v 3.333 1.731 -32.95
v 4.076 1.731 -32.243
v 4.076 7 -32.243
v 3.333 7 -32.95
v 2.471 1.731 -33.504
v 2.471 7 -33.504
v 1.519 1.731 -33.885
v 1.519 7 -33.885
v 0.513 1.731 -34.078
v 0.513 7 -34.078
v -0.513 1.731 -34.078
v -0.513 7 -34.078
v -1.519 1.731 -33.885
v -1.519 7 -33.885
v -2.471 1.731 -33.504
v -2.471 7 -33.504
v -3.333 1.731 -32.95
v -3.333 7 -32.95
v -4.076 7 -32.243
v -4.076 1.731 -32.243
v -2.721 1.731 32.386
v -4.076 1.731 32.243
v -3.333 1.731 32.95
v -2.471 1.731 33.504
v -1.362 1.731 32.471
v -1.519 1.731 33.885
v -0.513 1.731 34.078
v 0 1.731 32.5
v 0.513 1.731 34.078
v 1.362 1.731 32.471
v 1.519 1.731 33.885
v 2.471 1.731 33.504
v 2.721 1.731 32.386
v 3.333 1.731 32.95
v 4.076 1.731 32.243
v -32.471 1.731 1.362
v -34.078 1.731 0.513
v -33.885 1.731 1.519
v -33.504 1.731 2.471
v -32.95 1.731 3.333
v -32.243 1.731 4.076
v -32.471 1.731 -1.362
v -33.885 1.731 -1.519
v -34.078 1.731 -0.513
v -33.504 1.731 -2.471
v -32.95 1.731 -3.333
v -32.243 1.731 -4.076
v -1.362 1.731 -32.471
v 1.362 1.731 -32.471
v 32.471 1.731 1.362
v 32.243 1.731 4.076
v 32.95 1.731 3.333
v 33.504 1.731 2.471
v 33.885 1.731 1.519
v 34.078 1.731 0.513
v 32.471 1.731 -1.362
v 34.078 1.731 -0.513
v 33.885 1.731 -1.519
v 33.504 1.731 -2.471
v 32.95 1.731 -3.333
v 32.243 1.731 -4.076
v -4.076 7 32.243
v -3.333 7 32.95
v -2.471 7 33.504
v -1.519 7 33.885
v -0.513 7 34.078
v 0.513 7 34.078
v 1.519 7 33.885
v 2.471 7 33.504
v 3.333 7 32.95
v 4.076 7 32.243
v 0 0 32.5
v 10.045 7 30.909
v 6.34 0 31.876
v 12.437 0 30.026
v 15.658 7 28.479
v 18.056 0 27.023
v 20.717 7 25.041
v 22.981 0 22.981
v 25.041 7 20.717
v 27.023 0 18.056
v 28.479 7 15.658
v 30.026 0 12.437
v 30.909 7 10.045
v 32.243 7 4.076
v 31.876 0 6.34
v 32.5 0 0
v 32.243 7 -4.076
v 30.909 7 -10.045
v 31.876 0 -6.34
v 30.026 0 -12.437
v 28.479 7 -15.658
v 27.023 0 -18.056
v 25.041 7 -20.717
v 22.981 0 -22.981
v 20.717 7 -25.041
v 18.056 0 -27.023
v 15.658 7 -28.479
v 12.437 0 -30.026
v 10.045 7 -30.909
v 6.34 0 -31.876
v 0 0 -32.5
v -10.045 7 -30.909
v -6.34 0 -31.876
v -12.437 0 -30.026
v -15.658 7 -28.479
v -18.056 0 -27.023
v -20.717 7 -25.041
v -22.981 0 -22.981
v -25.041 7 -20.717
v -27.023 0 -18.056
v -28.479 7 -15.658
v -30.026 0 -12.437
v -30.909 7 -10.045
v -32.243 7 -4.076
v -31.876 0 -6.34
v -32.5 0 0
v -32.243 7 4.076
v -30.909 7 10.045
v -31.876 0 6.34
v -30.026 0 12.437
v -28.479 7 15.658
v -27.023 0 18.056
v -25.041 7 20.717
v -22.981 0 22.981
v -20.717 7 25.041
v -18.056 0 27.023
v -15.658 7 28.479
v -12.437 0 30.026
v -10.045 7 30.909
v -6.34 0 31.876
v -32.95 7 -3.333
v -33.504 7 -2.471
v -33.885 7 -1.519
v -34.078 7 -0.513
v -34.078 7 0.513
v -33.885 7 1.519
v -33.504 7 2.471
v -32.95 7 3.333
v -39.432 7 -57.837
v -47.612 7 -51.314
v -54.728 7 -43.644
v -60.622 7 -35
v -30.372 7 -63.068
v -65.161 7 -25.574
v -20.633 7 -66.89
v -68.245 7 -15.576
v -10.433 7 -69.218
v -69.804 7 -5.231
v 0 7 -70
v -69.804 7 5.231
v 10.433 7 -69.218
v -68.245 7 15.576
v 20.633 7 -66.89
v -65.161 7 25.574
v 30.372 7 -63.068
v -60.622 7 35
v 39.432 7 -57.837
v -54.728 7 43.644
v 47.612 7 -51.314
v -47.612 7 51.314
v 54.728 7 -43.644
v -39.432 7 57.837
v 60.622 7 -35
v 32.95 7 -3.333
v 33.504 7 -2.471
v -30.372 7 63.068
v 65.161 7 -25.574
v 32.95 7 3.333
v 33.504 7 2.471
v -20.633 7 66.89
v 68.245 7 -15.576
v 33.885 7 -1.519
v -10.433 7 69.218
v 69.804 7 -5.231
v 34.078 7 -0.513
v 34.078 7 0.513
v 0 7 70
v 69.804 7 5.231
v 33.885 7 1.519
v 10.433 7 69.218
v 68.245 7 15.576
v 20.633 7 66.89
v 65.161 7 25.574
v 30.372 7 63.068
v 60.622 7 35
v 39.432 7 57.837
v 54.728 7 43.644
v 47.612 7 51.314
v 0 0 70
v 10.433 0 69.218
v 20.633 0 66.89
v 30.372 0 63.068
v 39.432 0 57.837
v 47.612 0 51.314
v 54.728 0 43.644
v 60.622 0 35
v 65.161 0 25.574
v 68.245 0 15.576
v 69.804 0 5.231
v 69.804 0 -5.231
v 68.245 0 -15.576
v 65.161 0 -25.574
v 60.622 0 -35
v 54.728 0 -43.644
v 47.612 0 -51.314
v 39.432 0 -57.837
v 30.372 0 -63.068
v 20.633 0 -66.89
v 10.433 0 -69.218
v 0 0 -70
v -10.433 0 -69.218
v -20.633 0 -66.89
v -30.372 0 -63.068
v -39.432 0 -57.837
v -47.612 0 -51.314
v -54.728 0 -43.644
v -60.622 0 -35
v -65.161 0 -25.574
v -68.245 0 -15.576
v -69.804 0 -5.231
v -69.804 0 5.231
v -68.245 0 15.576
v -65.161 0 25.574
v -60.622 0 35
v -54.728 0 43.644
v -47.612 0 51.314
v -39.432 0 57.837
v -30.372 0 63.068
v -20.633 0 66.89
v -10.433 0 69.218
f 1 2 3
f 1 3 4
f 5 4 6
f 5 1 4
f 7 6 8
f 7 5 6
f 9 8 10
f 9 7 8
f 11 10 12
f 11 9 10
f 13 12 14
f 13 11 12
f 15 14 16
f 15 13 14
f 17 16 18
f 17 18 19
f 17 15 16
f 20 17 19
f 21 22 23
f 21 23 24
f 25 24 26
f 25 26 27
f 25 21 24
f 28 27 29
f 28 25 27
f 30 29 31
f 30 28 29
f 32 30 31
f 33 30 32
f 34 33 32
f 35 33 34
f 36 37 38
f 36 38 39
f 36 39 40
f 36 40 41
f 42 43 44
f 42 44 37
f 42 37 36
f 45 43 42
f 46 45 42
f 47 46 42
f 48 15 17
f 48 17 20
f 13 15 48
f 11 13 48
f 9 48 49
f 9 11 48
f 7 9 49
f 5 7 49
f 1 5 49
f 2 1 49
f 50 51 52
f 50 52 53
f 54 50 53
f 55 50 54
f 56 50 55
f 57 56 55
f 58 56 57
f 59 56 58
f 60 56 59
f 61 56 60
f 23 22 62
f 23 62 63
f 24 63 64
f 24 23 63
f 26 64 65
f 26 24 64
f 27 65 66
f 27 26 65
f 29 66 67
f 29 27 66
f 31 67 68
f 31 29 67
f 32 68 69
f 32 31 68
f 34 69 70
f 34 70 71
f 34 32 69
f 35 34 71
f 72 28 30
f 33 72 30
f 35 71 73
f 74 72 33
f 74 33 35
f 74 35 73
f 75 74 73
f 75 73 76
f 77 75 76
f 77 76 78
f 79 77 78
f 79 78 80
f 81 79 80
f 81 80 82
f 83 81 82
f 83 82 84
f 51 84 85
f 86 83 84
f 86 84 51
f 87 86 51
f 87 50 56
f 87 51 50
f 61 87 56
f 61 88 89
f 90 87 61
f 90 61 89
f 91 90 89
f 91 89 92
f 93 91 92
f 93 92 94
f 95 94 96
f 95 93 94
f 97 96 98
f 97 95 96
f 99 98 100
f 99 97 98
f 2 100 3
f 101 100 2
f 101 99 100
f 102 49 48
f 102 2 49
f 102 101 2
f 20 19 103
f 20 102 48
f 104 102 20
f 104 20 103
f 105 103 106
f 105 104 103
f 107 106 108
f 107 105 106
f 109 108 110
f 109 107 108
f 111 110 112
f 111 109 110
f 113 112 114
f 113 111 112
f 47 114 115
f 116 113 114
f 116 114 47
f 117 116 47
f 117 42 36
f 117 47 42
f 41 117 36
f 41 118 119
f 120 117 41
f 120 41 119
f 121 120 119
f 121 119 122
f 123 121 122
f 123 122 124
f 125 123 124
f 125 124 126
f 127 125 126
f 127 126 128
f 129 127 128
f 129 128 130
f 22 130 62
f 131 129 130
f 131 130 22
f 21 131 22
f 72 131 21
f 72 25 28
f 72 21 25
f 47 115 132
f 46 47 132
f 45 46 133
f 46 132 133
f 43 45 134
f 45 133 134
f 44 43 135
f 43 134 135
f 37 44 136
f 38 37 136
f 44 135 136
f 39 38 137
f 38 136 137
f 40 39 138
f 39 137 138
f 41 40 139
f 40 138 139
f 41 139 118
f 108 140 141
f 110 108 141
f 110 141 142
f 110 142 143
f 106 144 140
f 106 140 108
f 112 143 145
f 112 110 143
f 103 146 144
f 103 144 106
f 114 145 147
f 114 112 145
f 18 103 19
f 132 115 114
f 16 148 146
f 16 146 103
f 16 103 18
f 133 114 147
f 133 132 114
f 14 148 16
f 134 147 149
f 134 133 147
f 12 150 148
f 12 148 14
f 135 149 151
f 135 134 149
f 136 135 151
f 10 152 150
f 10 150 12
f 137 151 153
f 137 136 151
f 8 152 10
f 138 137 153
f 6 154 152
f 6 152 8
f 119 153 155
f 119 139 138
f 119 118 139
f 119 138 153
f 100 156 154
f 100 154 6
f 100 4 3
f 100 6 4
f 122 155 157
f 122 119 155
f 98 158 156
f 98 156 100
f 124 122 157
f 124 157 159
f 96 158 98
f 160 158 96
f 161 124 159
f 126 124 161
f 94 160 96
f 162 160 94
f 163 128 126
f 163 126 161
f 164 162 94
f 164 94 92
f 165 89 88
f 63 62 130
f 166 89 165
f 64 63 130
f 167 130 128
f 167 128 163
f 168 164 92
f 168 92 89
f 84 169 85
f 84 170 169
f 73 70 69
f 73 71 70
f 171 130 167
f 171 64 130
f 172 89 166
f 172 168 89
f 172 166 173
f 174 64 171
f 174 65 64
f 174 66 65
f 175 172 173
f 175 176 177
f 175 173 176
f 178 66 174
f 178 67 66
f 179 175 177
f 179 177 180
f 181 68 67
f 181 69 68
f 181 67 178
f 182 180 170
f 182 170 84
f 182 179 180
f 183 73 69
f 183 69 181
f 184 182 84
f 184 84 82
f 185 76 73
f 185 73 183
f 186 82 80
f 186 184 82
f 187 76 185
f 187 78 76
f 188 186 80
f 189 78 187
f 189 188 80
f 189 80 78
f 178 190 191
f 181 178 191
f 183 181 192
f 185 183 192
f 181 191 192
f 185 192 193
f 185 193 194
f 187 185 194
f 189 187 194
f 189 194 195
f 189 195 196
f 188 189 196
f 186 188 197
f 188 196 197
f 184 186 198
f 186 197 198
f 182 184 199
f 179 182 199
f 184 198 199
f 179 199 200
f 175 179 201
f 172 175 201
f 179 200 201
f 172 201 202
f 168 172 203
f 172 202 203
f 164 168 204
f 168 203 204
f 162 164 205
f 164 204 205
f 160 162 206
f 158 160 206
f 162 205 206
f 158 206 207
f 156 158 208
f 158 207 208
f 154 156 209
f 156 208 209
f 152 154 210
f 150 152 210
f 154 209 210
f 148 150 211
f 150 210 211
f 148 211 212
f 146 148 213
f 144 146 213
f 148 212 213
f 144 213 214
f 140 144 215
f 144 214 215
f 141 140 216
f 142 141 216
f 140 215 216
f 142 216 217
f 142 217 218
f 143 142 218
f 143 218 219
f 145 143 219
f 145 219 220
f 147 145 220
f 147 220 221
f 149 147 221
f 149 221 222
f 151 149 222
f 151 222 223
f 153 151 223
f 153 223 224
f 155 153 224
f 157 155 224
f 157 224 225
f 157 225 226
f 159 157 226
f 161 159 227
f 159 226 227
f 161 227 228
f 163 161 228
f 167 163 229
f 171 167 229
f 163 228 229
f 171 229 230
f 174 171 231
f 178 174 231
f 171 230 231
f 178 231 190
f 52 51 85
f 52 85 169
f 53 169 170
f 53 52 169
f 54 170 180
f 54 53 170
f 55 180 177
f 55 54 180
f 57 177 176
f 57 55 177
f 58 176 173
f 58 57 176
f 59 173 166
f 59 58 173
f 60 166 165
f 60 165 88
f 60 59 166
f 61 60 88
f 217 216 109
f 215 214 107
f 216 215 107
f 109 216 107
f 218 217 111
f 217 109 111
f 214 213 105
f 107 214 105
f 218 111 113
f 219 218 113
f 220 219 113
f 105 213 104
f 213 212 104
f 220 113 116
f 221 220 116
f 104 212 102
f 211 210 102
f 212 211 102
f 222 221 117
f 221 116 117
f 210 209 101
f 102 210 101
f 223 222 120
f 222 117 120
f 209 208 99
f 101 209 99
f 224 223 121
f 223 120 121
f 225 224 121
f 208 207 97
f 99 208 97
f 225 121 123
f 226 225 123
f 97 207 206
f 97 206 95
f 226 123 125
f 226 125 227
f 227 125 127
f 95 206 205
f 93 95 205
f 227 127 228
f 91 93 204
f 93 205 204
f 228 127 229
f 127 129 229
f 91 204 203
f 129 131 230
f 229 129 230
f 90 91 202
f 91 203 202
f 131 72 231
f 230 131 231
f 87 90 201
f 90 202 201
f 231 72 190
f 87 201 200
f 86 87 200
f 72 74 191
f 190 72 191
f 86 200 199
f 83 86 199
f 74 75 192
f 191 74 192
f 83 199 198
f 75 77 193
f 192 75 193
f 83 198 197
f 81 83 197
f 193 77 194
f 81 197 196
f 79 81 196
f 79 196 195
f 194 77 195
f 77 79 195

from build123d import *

# Parameters (mm, degrees)
SKETCH1_R           = 70
BOSS_EXTRUDE1_DEPTH = 7
SKETCH2_R           = 32.5
CUT_EXTRUDE1_DEPTH  = 100.242128151
SKETCH3_R           = 5.396472421
CUT_EXTRUDE2_DEPTH  = 5.268711771
CIRPATTERN1_COUNT   = 4


with BuildPart() as part:
    # Sketch1 → Boss-Extrude1 (new body)
    with BuildSketch(Plane(origin=(0, 0, 0), x_dir=(1, 0, 0), z_dir=(0, 1, 0))):
        Circle(SKETCH1_R)
    extrude(amount=BOSS_EXTRUDE1_DEPTH)

    # Sketch2 → Cut-Extrude1 (cut, through all)
    with BuildSketch(Plane(origin=(0, 0, 0), x_dir=(1, 0, 0), z_dir=(0, 1, 0))):
        Circle(SKETCH2_R)
    extrude(amount=CUT_EXTRUDE1_DEPTH, mode=Mode.SUBTRACT)

    # Sketch3 → Cut-Extrude2 (cut)
    with BuildSketch(Plane(origin=(0, 7, 0), x_dir=(1, 0, 0), z_dir=(0, 1, 0))):
        with Locations((-28.706374574, 0)):
            Circle(SKETCH3_R)
    cut_extrude2 = extrude(amount=-CUT_EXTRUDE2_DEPTH, mode=Mode.SUBTRACT)

    # CirPattern1: Cut-Extrude2 ×4 about axis
    cirpattern1_axis = Axis((0, 0, 0), (0, 1, 0))
    for i in range(1, CIRPATTERN1_COUNT):
        add(cut_extrude2.rotate(cirpattern1_axis, i * 360 / CIRPATTERN1_COUNT), mode=Mode.SUBTRACT)


solid = part.part
